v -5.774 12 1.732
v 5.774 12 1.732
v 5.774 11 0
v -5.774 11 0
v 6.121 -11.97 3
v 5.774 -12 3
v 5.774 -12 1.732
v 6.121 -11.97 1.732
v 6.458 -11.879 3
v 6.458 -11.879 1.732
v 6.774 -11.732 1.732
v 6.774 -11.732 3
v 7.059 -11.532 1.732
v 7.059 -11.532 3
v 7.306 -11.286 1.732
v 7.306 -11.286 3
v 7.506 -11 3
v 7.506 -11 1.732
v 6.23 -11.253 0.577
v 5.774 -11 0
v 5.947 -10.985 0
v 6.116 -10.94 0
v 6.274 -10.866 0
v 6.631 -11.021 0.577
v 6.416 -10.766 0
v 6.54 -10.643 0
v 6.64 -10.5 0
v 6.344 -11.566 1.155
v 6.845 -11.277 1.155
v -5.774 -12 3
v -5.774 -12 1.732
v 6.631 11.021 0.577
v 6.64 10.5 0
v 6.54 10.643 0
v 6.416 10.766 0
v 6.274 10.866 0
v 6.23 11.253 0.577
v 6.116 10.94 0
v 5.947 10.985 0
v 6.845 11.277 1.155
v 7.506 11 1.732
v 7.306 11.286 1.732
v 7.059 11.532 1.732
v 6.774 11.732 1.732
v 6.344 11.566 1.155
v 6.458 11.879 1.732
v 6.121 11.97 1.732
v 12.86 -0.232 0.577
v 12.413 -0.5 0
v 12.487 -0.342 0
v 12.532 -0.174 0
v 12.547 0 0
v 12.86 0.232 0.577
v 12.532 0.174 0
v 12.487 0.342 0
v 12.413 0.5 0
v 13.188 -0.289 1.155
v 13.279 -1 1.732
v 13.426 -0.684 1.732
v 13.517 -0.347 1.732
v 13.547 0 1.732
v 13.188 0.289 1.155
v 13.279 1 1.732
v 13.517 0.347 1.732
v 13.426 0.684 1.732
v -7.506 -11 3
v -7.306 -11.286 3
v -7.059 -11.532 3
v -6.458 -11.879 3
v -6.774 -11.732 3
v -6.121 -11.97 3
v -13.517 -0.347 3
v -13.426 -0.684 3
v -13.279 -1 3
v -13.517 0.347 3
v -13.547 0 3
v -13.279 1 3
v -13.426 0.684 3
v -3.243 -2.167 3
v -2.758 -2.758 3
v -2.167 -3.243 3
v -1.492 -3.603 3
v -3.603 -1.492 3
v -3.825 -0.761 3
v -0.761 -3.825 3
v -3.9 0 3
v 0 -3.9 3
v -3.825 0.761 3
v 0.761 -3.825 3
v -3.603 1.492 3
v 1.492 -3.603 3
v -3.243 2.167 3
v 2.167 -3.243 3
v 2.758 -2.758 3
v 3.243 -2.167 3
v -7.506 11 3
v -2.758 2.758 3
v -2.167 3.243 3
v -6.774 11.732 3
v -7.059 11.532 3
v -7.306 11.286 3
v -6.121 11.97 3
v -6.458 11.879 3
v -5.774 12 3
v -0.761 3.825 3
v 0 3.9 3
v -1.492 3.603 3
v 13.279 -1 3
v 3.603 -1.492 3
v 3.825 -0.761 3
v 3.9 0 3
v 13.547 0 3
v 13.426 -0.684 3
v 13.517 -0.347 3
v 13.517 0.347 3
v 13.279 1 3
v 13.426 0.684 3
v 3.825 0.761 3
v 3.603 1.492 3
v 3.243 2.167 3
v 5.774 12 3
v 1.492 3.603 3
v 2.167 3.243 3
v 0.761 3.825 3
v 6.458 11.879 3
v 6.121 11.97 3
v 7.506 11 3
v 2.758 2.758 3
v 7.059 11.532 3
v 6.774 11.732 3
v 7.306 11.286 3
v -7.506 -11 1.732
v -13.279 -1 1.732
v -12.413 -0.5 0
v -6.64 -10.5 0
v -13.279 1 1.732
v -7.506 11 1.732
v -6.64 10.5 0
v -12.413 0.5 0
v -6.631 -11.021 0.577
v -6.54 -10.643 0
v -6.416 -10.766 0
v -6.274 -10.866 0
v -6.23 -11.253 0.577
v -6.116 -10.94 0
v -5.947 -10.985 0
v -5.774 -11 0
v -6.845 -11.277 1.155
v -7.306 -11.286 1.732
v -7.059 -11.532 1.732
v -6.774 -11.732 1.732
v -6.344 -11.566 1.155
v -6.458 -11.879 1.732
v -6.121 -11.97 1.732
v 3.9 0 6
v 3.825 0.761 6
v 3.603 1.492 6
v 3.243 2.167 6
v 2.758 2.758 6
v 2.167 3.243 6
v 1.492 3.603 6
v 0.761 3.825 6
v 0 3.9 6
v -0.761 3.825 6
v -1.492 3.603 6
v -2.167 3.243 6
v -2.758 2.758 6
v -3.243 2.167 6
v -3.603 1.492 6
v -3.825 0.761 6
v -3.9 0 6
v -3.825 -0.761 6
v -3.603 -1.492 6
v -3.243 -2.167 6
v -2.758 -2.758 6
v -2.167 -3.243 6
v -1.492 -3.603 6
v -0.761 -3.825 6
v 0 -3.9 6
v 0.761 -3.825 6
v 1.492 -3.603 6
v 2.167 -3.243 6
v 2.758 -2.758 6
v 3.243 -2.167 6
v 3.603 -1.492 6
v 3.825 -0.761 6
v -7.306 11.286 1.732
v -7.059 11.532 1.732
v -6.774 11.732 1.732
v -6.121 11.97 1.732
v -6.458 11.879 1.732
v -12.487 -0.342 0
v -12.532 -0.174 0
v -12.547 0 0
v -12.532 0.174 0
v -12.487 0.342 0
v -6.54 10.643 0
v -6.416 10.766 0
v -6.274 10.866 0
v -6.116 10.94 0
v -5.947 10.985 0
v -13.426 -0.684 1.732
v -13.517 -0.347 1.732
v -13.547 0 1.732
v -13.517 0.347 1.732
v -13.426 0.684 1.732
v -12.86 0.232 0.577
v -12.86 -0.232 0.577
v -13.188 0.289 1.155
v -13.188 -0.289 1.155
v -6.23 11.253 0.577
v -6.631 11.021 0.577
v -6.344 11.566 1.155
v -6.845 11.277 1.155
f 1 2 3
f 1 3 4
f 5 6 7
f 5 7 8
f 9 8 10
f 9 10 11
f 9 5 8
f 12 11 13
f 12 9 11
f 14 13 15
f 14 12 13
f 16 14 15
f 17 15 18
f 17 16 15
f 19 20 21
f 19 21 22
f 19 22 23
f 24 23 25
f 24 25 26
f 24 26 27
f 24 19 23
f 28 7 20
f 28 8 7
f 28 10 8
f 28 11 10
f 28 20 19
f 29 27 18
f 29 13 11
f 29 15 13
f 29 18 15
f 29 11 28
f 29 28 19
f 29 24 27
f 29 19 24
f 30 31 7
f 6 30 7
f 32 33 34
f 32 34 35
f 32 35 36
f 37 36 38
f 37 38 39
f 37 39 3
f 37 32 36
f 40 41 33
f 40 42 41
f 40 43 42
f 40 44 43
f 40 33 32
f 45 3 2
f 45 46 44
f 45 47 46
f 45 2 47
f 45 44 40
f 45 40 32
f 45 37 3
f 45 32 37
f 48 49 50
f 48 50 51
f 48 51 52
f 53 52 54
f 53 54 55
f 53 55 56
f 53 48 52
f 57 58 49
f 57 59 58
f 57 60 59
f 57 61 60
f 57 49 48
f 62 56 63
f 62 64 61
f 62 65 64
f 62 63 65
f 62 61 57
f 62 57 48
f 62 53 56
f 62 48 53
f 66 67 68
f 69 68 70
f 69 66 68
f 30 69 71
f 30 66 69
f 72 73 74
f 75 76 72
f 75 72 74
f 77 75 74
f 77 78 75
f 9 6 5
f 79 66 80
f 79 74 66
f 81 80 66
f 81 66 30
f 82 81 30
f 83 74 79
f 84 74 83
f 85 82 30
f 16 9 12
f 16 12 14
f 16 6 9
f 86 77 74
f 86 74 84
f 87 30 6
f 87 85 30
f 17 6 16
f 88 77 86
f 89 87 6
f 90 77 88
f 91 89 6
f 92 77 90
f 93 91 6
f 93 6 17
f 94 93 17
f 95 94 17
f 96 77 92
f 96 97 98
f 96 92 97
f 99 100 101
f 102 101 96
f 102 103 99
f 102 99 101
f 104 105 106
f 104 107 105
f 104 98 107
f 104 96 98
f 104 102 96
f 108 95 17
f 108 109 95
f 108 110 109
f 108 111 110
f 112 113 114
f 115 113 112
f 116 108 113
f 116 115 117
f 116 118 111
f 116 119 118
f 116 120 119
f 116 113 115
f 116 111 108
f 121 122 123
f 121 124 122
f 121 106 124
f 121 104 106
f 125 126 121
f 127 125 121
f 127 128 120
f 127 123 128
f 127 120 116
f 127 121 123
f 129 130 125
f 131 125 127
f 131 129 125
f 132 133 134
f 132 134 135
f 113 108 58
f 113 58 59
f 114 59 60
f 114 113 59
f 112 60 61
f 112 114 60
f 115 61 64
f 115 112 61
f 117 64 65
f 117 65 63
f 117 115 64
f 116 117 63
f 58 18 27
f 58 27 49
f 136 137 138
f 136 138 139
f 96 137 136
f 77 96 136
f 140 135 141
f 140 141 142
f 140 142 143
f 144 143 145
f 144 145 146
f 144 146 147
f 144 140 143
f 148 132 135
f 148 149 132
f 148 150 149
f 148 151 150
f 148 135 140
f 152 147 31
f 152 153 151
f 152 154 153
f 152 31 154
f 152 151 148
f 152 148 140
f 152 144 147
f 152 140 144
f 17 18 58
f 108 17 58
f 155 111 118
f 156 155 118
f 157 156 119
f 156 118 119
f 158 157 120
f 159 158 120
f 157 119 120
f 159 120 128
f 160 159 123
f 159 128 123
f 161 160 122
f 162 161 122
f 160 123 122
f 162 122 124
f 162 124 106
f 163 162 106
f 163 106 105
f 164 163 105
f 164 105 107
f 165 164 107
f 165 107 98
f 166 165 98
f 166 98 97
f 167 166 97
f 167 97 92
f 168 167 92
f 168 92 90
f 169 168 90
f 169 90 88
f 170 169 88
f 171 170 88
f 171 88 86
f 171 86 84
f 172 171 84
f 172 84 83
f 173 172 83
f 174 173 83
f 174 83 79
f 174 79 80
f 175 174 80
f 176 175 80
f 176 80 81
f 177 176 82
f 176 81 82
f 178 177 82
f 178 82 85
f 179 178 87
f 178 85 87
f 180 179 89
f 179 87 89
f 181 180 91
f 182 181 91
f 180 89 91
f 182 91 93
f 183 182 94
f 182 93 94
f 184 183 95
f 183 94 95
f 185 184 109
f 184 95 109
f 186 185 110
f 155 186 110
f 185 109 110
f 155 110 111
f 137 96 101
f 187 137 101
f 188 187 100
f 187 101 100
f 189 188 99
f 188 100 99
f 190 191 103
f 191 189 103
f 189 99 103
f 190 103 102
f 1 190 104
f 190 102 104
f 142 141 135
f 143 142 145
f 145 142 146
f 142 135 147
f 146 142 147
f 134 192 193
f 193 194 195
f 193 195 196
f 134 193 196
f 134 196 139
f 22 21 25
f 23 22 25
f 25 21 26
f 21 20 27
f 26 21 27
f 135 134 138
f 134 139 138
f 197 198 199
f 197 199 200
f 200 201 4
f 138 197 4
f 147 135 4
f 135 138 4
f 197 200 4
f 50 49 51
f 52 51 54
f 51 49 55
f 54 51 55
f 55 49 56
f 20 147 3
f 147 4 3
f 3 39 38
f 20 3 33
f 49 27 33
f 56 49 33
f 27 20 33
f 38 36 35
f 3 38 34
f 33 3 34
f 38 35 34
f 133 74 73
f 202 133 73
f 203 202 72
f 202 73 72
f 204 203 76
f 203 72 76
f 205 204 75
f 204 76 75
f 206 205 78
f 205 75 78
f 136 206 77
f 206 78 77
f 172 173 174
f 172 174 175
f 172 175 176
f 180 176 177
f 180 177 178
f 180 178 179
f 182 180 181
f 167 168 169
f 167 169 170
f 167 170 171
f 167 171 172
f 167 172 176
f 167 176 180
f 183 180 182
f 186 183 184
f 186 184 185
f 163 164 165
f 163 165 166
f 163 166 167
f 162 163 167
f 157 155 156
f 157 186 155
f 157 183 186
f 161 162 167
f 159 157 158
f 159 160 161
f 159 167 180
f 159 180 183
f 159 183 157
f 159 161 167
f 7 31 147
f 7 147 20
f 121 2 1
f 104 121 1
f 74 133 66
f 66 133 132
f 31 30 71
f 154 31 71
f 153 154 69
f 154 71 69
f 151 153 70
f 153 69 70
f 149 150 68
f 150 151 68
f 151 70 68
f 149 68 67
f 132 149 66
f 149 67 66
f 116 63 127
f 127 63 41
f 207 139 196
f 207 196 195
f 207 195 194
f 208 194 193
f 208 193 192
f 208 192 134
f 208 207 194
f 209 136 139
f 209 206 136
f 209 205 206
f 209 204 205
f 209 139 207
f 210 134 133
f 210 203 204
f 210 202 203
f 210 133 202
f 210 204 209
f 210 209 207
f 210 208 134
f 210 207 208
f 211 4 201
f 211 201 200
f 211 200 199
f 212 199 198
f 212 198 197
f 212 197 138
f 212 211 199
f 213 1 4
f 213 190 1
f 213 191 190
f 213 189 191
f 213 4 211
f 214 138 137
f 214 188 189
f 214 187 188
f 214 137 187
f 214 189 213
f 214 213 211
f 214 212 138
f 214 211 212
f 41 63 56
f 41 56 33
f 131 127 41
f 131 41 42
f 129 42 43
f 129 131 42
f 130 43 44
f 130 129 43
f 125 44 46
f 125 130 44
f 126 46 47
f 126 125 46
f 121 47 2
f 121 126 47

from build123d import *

# Parameters (mm, degrees)
F1_R     = 3.9
F2_DEPTH = 3
F3_R     = 3.9
F4_DEPTH = 6
F5_R     = 2
F6_SIZE2 = 1.7320508076
F6_SIZE  = 1


with BuildPart() as f2:
    # F1 (on face) → F2 (new body)
    with BuildSketch(Plane.XY):
        Polygon((-6.9282032303, -12), (6.9282032303, -12), (13.8564064606, 0), (6.9282032303, 12), (-6.9282032303, 12), (-13.8564064606, 0), align=None)
        Circle(F1_R, mode=Mode.SUBTRACT)
    extrude(amount=F2_DEPTH)

    # F3 (on Top) → F4 (join)
    with BuildSketch(Plane.XY):
        Circle(F3_R)
    extrude(amount=F4_DEPTH)

    # F5
    f5_edges = [f2.edges().sort_by_distance(p)[0] for p in [
        (13.856406, 0, 1.5),
        (6.928203, -12, 1.5),
        (-6.928203, -12, 1.5),
        (-13.856406, 0, 1.5),
        (-6.928203, 12, 1.5),
        (6.928203, 12, 1.5),
    ]]
    fillet(f5_edges, radius=F5_R)

    # F6
    f6_edges = [f2.edges().sort_by_distance(p)[0] for p in [
        (0, -12, 0),
    ]]
    f6_side = f2.faces().sort_by_distance((0, 0, 0))[0]
    chamfer(f6_edges, length=F6_SIZE, length2=F6_SIZE2, reference=f6_side)


solid = f2.part
